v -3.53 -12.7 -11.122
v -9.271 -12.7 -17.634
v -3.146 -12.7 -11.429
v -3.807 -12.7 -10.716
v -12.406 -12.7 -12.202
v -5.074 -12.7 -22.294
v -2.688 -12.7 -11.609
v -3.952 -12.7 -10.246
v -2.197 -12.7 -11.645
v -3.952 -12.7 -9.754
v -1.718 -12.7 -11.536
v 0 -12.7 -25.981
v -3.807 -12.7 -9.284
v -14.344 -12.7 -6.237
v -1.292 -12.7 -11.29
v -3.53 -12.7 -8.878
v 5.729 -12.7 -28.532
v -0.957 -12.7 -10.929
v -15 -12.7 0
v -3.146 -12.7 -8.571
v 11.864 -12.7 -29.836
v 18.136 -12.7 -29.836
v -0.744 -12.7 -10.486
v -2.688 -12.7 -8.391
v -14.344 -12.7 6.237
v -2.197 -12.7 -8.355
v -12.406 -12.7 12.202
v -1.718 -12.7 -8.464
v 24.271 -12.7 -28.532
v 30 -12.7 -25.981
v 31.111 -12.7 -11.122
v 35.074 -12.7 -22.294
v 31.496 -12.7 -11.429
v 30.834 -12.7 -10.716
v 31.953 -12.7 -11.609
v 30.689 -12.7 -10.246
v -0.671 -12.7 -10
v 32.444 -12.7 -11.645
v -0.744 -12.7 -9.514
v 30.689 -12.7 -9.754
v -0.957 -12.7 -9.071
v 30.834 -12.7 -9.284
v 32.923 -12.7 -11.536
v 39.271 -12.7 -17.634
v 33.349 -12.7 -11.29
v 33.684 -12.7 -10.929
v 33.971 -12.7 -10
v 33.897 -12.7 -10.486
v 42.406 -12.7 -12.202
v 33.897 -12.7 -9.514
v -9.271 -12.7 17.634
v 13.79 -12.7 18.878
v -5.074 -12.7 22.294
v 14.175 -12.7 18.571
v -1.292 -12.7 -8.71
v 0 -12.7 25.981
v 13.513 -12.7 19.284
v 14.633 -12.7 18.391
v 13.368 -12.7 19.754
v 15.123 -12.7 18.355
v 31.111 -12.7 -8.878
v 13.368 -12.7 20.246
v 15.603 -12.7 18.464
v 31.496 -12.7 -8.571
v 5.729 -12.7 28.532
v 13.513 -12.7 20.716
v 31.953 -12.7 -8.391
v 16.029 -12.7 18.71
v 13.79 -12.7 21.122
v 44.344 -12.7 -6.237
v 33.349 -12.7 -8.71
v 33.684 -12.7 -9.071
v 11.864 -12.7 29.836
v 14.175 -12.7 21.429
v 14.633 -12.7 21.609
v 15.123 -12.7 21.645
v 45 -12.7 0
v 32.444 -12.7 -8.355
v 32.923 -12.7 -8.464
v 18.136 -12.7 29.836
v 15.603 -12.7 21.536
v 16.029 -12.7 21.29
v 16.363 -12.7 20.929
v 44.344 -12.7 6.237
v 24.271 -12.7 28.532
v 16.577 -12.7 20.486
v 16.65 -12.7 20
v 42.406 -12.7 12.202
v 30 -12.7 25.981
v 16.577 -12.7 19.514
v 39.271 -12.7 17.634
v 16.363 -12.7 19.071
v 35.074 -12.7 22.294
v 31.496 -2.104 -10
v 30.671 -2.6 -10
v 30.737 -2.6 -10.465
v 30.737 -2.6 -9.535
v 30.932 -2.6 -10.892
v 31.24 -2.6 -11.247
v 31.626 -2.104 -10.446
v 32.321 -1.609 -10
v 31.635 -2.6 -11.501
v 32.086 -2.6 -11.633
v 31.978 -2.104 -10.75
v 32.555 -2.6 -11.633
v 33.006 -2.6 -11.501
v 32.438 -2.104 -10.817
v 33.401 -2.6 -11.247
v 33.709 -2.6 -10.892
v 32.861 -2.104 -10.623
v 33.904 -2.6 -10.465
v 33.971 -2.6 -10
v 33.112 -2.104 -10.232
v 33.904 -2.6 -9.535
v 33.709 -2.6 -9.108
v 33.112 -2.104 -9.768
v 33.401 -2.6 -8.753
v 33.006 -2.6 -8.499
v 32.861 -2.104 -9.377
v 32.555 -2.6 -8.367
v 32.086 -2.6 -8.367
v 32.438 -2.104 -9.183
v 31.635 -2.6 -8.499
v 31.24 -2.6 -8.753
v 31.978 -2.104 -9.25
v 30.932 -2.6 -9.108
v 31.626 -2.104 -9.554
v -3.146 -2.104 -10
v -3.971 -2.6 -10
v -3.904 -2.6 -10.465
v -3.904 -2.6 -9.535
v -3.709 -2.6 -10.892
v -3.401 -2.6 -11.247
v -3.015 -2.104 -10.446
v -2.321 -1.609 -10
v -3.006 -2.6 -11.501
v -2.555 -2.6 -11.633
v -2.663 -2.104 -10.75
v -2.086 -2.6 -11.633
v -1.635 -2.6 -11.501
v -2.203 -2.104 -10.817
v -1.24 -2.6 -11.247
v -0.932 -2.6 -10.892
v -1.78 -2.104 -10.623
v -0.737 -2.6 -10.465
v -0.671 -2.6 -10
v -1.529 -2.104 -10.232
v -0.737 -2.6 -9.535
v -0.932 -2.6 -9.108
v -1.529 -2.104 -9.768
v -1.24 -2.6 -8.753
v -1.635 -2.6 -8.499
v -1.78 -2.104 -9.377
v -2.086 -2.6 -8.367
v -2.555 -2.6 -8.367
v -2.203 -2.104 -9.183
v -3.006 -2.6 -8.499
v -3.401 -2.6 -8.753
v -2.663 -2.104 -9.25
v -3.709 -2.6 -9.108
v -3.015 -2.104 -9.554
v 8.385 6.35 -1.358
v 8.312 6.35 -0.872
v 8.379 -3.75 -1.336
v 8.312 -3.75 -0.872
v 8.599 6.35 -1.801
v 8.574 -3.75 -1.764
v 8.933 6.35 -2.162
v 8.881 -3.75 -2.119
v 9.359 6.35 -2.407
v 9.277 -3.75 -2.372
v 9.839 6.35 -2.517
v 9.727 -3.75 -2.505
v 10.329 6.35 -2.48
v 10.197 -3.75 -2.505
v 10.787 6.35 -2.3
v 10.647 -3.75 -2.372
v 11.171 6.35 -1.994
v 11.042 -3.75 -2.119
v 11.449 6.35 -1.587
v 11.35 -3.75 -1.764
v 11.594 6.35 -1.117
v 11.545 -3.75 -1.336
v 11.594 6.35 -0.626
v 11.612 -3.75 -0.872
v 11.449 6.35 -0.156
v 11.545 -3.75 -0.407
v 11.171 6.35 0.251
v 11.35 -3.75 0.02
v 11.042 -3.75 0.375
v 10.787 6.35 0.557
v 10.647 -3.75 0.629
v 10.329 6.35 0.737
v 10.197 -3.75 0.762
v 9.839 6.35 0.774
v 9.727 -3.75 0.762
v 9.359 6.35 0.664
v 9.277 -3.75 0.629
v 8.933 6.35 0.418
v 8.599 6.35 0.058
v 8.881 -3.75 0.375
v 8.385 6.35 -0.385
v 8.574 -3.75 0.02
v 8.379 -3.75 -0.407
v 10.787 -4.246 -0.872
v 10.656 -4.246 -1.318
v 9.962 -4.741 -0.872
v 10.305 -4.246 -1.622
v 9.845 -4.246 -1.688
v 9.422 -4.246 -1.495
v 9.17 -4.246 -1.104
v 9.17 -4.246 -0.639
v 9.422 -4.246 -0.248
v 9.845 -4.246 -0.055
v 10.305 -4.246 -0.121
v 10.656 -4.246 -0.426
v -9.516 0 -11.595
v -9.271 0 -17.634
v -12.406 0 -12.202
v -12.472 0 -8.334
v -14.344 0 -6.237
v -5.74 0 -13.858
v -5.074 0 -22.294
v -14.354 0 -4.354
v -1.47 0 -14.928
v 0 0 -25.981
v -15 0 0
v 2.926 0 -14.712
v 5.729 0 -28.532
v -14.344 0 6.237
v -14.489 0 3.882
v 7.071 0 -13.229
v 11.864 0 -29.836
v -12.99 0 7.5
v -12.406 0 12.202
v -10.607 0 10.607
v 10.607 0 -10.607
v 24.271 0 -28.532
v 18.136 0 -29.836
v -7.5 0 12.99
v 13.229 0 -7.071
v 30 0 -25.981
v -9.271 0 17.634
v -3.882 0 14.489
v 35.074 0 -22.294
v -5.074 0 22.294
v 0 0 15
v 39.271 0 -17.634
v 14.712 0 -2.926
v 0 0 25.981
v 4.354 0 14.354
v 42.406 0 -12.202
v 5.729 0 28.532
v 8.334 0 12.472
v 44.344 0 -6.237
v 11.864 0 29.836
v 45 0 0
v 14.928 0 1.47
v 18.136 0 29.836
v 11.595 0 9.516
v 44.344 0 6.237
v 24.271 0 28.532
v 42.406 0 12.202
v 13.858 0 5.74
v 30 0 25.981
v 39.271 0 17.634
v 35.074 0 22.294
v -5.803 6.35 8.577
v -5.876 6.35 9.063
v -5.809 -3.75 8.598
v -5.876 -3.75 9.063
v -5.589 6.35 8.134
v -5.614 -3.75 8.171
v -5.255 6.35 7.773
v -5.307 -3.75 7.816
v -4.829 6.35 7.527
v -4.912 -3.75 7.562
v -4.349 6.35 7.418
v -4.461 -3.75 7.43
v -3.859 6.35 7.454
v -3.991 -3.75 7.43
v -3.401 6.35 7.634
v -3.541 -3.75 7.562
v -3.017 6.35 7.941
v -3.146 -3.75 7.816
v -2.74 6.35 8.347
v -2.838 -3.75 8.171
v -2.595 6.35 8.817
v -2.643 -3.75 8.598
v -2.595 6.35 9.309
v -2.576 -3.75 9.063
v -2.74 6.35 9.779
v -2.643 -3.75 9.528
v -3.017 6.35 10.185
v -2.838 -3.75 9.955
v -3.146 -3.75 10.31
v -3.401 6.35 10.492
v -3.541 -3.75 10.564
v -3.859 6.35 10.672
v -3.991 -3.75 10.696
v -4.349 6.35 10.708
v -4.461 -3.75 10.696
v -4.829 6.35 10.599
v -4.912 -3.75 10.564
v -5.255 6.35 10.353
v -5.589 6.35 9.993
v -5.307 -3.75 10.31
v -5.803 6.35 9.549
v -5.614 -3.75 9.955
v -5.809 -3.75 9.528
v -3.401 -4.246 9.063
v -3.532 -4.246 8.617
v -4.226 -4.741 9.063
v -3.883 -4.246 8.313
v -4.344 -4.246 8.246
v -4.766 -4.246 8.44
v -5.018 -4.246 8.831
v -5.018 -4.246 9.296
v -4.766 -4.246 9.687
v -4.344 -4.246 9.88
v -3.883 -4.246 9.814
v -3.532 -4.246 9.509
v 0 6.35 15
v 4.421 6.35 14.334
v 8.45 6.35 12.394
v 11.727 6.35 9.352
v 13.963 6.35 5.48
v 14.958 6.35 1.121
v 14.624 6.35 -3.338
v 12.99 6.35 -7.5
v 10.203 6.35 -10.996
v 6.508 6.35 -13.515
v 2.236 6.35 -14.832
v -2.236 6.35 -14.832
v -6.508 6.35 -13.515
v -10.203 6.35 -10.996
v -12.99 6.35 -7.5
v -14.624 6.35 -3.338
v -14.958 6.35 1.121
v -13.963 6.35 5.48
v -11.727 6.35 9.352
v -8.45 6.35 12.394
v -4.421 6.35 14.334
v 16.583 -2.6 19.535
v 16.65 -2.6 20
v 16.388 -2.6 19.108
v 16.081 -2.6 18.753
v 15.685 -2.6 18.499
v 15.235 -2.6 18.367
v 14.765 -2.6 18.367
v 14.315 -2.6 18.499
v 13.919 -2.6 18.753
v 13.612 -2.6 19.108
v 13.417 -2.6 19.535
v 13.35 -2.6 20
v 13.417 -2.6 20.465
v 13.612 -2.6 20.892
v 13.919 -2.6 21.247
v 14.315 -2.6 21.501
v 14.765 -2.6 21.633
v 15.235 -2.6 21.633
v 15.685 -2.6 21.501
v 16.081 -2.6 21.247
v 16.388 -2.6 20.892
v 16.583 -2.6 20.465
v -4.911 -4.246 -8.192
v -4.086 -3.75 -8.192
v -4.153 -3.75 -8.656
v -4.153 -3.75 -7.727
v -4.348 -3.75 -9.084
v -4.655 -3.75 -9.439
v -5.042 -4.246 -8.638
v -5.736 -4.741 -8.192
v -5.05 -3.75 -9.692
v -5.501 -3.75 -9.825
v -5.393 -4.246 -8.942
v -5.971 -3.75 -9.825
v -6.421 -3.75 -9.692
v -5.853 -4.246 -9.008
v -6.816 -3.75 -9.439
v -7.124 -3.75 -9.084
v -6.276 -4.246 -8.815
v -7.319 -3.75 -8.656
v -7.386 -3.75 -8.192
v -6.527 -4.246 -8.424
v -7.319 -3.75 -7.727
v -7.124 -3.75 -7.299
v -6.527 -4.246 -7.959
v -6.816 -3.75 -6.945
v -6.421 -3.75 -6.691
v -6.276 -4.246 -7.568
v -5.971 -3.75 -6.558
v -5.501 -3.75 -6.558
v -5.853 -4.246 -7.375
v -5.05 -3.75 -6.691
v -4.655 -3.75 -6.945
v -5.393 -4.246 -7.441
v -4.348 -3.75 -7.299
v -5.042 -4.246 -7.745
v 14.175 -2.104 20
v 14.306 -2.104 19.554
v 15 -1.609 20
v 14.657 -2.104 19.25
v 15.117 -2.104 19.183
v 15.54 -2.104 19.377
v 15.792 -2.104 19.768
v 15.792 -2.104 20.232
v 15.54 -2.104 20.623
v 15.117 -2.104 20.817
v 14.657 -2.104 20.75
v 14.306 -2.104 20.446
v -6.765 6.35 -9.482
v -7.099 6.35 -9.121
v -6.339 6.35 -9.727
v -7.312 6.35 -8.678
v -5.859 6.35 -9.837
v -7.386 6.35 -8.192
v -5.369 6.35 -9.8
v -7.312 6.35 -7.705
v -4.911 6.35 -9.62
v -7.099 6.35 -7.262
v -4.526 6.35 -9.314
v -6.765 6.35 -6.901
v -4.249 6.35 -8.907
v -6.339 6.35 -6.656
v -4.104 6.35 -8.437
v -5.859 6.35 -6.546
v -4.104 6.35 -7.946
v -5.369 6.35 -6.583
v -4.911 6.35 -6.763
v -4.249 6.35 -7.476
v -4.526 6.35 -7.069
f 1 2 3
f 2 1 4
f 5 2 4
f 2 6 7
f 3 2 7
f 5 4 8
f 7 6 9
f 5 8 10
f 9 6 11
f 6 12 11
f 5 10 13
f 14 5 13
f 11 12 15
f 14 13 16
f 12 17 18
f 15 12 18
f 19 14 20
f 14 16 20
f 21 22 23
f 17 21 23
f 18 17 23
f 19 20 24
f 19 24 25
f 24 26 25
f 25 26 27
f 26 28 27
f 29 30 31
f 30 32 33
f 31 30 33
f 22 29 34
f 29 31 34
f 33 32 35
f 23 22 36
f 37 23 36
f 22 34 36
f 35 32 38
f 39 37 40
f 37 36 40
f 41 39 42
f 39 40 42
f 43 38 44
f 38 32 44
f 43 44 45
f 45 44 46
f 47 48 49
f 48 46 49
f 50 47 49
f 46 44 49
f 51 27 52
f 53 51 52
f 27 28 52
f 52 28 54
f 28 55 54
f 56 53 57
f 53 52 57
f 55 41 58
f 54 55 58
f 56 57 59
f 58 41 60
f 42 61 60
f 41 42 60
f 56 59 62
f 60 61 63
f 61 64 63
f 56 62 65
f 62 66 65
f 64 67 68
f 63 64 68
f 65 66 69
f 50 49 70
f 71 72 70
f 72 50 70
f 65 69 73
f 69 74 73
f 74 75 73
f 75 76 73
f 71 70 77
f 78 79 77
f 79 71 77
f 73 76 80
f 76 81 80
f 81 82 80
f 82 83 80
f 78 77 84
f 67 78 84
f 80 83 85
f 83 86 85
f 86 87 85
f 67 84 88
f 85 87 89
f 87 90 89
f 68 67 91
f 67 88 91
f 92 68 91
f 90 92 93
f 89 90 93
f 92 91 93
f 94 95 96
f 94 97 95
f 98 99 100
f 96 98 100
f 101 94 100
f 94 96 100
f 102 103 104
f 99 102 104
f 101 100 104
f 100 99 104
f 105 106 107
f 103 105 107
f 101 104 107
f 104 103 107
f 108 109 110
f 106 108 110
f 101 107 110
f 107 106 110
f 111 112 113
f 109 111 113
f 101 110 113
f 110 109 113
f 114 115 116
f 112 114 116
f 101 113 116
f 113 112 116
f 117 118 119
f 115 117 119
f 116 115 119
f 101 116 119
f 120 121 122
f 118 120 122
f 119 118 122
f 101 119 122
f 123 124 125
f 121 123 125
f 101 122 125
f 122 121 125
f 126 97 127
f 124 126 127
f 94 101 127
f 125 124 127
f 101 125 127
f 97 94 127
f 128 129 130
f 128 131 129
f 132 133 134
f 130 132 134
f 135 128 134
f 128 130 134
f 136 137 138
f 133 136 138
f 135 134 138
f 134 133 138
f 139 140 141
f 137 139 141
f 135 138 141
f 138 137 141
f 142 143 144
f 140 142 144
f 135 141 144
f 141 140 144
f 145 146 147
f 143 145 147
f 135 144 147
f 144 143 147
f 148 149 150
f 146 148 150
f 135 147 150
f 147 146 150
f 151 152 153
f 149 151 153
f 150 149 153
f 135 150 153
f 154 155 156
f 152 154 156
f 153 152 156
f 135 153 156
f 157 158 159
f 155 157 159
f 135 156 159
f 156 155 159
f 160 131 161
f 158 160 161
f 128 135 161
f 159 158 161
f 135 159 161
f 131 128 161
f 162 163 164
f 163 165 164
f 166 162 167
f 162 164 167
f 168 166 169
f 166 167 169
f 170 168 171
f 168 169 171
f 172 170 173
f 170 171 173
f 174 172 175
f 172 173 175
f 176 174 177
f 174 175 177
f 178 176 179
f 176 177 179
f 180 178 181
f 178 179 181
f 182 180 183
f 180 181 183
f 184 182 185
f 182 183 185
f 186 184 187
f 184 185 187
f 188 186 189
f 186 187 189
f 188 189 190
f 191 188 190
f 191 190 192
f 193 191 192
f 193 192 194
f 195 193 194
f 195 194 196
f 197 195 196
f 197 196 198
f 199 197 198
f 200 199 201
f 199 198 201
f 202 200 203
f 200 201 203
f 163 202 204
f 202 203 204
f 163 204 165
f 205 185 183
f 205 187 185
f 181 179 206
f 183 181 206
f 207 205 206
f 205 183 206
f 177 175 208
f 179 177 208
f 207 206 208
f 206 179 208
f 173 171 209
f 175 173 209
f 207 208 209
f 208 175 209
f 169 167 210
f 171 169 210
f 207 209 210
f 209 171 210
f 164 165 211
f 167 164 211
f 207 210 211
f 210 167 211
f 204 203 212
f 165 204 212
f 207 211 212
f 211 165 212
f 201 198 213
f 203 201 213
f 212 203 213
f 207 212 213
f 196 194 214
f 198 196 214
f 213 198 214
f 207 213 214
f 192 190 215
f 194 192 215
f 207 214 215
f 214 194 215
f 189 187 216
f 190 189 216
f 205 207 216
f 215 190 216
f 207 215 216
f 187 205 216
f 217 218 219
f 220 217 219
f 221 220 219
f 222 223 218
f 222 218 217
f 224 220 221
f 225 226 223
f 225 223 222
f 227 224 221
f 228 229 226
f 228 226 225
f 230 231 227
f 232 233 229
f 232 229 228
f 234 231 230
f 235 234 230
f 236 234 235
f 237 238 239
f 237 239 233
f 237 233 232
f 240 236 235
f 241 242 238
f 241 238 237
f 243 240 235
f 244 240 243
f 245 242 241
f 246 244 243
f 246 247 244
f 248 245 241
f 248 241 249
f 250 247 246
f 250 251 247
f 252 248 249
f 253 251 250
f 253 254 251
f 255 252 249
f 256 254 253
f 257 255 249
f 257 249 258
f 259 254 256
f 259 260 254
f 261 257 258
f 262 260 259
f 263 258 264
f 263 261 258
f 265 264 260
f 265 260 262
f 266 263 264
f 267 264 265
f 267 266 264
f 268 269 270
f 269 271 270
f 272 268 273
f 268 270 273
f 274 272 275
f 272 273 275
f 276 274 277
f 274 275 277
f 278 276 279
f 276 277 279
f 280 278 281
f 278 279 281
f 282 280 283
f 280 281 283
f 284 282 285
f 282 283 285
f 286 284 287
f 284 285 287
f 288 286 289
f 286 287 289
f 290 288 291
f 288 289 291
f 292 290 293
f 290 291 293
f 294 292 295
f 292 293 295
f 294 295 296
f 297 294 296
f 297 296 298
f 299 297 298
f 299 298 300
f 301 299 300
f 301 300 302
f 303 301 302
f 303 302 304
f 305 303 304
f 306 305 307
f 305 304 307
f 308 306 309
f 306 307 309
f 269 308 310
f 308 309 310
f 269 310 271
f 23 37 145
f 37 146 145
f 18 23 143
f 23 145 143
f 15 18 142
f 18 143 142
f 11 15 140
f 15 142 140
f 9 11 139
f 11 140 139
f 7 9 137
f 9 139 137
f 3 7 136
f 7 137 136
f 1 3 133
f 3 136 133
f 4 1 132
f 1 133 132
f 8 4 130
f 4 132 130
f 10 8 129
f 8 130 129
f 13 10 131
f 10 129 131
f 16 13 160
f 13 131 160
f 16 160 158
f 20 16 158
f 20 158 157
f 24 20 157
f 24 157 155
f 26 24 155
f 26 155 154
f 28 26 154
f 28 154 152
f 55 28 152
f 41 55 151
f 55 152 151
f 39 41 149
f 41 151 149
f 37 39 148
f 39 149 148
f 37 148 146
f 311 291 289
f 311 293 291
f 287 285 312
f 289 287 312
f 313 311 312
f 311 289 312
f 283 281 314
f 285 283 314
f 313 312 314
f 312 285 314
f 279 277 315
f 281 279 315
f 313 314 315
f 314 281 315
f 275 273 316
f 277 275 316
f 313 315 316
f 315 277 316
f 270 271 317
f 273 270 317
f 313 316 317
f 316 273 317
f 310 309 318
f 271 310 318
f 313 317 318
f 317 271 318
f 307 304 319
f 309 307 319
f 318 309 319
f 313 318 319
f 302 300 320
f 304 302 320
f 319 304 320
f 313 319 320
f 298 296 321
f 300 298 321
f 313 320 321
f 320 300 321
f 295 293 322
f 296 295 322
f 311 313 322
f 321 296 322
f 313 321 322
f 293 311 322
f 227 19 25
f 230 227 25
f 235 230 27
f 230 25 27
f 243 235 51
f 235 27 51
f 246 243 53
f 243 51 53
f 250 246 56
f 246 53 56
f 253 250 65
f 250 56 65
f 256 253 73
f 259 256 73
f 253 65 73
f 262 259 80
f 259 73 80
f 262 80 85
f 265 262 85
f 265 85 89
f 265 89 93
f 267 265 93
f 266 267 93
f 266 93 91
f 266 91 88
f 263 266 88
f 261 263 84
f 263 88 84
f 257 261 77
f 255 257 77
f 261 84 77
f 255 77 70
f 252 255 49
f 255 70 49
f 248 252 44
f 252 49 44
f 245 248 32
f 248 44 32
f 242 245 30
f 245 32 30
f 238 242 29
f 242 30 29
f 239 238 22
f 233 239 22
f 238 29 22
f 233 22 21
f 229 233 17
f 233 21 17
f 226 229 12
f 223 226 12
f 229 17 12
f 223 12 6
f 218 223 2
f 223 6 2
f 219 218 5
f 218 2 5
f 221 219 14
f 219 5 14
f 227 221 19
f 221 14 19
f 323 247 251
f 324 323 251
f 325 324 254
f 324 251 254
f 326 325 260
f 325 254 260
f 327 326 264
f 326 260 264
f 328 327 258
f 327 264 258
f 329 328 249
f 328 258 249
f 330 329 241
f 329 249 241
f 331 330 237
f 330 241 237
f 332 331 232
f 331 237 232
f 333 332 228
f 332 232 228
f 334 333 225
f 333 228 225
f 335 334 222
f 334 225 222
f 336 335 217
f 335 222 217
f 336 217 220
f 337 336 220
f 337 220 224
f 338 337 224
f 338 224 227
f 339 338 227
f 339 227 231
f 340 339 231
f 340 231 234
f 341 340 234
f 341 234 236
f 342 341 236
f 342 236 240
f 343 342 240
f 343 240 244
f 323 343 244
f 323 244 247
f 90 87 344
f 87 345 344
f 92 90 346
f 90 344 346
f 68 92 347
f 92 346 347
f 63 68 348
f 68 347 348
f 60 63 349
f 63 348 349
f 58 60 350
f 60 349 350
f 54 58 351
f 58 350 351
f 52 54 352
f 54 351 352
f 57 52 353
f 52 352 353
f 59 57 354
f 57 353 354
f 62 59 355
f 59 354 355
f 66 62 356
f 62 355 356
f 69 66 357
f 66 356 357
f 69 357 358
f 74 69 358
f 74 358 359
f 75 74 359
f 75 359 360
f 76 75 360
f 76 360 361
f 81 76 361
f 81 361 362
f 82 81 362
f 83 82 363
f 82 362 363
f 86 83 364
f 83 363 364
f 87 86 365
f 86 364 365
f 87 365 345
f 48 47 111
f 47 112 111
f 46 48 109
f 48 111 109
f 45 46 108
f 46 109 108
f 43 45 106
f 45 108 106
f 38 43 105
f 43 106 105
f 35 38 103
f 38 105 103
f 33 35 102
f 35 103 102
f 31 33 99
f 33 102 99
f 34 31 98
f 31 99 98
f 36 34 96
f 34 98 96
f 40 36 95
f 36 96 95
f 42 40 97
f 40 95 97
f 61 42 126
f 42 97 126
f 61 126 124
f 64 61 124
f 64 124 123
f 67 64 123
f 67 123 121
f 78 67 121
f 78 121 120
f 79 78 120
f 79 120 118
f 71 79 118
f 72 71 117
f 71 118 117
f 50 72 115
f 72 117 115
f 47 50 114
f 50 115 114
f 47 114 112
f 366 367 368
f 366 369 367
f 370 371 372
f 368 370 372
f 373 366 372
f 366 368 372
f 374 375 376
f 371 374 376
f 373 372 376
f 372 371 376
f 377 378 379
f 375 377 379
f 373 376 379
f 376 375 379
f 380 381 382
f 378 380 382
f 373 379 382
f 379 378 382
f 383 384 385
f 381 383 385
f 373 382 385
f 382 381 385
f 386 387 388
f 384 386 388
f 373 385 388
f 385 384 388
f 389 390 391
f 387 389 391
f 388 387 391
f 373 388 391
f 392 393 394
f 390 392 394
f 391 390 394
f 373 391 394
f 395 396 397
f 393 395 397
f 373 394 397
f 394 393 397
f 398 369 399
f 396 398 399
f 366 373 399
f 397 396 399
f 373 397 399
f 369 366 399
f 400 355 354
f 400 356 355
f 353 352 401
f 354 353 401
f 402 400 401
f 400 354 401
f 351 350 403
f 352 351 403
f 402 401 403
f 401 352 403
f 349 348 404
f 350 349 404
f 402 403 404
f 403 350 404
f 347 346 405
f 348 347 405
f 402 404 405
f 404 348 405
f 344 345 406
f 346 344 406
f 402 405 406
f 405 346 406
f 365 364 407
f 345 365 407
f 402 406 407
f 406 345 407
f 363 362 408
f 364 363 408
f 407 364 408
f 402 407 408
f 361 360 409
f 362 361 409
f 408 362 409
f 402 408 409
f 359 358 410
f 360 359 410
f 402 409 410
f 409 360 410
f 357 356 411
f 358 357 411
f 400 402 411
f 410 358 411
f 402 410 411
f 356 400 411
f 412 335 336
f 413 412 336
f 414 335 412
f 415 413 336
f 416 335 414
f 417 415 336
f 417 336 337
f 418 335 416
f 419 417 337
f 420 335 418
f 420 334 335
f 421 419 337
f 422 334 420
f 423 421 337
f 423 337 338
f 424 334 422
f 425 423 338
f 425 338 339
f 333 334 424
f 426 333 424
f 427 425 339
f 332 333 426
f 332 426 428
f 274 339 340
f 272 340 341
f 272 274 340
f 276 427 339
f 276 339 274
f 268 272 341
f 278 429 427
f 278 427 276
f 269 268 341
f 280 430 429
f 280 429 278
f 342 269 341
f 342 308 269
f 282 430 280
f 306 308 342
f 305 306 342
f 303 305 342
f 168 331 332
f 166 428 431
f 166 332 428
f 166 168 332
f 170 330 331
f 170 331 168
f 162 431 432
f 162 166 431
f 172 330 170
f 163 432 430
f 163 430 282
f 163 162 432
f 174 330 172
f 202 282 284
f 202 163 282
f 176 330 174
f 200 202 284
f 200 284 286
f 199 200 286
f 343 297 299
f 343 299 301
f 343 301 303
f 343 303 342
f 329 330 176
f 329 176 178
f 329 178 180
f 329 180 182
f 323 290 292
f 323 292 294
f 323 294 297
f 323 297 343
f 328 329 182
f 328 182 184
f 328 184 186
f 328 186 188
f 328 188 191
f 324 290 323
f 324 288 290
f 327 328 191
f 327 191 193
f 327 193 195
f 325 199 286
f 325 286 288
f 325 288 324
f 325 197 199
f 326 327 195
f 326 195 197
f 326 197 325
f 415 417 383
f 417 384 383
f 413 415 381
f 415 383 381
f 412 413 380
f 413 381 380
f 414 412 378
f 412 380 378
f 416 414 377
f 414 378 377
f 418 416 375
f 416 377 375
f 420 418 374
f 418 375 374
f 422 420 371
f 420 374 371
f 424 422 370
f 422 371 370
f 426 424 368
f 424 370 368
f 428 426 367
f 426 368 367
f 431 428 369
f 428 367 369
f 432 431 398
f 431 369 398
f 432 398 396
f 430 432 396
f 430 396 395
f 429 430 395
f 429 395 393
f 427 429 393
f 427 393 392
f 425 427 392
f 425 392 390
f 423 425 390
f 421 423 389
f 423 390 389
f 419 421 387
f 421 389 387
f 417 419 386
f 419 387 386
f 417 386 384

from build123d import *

# Parameters (mm, degrees)
BOSS_EXTRUDE1_DEPTH       = 6.35
SKETCH2_3_R               = 30
BOSS_EXTRUDE2_DEPTH       = 12.7
M4X0_7_TAPPED_HOLE1_D     = 3.3
M4X0_7_TAPPED_HOLE1_DEPTH = 10.1
M4X0_7_TAPPED_HOLE1_TIP   = 0.991420021
M4X0_7_TAPPED_HOLE3_D     = 3.3
M4X0_7_TAPPED_HOLE3_DEPTH = 10.1
M4X0_7_TAPPED_HOLE3_TIP   = 0.991420021


with BuildPart() as part:
    # Sketch2 → Boss-Extrude1 (new body)
    with BuildSketch(Plane(origin=(0, 0, 0), x_dir=(1, 0, 0), z_dir=(0, 1, 0))):
        with BuildLine():
            ThreePointArc((-15, 0), (0, -15), (15, 0))
            ThreePointArc((15, 0), (0, 15), (-15, 0))
        make_face()
    extrude(amount=BOSS_EXTRUDE1_DEPTH)

    # Sketch2<3> → Boss-Extrude2 (add)
    with BuildSketch(Plane(origin=(0, 0, 0), x_dir=(1, 0, 0), z_dir=(0, 1, 0))):
        with Locations((15, 0)):
            Circle(SKETCH2_3_R)
    extrude(amount=-BOSS_EXTRUDE2_DEPTH)

    # M4x0.7 Tapped Hole1
    with Locations(Plane(origin=(0, 6.35, 0), x_dir=(1, 0, 0), z_dir=(0, 1, 0))):
        with Locations((-4.226182617, -9.06307787), (9.961946981, 0.871557427), (-5.735764364, 8.191520443)):
            Hole(M4X0_7_TAPPED_HOLE1_D / 2, depth=M4X0_7_TAPPED_HOLE1_DEPTH)
            with Locations((0, 0, -(M4X0_7_TAPPED_HOLE1_DEPTH + M4X0_7_TAPPED_HOLE1_TIP / 2))):  # 118° drill point
                Cone(0, M4X0_7_TAPPED_HOLE1_D / 2, M4X0_7_TAPPED_HOLE1_TIP, mode=Mode.SUBTRACT)

    # M4x0.7 Tapped Hole3
    with Locations(Plane(origin=(0, -12.7, 0), x_dir=(-1, 0, 0), z_dir=(0, -1, 0))):
        with Locations((-15, -20), (2.320508076, 10), (-32.320508076, 10)):
            Hole(M4X0_7_TAPPED_HOLE3_D / 2, depth=M4X0_7_TAPPED_HOLE3_DEPTH)
            with Locations((0, 0, -(M4X0_7_TAPPED_HOLE3_DEPTH + M4X0_7_TAPPED_HOLE3_TIP / 2))):  # 118° drill point
                Cone(0, M4X0_7_TAPPED_HOLE3_D / 2, M4X0_7_TAPPED_HOLE3_TIP, mode=Mode.SUBTRACT)


solid = part.part
